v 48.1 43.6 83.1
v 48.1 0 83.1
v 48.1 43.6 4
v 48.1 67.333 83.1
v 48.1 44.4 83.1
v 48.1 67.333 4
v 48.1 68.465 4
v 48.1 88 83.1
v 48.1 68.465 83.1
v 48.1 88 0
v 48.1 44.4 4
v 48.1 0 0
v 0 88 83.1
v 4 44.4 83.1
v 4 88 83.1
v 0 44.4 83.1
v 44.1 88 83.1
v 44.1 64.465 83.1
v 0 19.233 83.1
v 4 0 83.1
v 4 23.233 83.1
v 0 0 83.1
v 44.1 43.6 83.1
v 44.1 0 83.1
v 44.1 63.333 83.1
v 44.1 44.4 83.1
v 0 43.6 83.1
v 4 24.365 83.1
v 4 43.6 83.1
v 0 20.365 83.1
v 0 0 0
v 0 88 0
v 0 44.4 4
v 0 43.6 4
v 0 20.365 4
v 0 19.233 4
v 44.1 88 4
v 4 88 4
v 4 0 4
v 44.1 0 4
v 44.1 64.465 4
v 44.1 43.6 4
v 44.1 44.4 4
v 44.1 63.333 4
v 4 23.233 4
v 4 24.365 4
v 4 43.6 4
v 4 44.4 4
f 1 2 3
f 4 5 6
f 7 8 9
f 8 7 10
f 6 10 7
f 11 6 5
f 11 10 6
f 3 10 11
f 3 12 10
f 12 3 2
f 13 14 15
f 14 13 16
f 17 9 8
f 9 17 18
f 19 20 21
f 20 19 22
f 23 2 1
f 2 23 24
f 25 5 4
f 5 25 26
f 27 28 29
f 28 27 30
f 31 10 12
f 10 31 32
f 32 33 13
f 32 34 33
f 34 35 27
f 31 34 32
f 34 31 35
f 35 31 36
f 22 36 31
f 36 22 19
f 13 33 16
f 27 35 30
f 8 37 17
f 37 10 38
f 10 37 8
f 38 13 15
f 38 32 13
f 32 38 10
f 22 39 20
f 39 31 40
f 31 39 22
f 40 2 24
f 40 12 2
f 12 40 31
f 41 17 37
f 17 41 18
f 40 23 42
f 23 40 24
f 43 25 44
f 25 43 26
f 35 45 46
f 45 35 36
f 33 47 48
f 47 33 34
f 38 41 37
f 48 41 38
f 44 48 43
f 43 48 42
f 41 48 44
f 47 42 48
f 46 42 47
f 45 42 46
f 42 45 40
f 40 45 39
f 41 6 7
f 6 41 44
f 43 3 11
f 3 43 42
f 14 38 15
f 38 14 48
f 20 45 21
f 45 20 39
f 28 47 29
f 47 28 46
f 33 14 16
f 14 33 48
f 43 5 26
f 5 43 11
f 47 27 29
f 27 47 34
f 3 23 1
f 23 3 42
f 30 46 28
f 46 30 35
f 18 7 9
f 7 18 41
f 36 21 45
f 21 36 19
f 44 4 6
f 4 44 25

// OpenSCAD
length = 80;
depth = 40.1;
saw_blade_height = 35;

height = depth + saw_blade_height;
wall = 4;
overcut = 5;
blade_cut_width = 0.8;

difference() {
  cube([depth + wall * 2, length + wall * 2, height + wall * 2]);
  translate([wall, -wall - overcut, wall]) cube([depth, length + wall * 2 + overcut * 2, height + wall * 2 + overcut]);

  translate([-overcut, (length - blade_cut_width) / 2 + wall, wall]) cube([depth + wall * 2 + overcut * 2, blade_cut_width, height + overcut]);

  rotate([0, 0, 45]) translate([-overcut - wall * 2 + 20, (length - blade_cut_width) / 2 + wall - 30, wall]) cube([depth * 2 + wall * 2 + overcut * 2, blade_cut_width, height + overcut]);
}
